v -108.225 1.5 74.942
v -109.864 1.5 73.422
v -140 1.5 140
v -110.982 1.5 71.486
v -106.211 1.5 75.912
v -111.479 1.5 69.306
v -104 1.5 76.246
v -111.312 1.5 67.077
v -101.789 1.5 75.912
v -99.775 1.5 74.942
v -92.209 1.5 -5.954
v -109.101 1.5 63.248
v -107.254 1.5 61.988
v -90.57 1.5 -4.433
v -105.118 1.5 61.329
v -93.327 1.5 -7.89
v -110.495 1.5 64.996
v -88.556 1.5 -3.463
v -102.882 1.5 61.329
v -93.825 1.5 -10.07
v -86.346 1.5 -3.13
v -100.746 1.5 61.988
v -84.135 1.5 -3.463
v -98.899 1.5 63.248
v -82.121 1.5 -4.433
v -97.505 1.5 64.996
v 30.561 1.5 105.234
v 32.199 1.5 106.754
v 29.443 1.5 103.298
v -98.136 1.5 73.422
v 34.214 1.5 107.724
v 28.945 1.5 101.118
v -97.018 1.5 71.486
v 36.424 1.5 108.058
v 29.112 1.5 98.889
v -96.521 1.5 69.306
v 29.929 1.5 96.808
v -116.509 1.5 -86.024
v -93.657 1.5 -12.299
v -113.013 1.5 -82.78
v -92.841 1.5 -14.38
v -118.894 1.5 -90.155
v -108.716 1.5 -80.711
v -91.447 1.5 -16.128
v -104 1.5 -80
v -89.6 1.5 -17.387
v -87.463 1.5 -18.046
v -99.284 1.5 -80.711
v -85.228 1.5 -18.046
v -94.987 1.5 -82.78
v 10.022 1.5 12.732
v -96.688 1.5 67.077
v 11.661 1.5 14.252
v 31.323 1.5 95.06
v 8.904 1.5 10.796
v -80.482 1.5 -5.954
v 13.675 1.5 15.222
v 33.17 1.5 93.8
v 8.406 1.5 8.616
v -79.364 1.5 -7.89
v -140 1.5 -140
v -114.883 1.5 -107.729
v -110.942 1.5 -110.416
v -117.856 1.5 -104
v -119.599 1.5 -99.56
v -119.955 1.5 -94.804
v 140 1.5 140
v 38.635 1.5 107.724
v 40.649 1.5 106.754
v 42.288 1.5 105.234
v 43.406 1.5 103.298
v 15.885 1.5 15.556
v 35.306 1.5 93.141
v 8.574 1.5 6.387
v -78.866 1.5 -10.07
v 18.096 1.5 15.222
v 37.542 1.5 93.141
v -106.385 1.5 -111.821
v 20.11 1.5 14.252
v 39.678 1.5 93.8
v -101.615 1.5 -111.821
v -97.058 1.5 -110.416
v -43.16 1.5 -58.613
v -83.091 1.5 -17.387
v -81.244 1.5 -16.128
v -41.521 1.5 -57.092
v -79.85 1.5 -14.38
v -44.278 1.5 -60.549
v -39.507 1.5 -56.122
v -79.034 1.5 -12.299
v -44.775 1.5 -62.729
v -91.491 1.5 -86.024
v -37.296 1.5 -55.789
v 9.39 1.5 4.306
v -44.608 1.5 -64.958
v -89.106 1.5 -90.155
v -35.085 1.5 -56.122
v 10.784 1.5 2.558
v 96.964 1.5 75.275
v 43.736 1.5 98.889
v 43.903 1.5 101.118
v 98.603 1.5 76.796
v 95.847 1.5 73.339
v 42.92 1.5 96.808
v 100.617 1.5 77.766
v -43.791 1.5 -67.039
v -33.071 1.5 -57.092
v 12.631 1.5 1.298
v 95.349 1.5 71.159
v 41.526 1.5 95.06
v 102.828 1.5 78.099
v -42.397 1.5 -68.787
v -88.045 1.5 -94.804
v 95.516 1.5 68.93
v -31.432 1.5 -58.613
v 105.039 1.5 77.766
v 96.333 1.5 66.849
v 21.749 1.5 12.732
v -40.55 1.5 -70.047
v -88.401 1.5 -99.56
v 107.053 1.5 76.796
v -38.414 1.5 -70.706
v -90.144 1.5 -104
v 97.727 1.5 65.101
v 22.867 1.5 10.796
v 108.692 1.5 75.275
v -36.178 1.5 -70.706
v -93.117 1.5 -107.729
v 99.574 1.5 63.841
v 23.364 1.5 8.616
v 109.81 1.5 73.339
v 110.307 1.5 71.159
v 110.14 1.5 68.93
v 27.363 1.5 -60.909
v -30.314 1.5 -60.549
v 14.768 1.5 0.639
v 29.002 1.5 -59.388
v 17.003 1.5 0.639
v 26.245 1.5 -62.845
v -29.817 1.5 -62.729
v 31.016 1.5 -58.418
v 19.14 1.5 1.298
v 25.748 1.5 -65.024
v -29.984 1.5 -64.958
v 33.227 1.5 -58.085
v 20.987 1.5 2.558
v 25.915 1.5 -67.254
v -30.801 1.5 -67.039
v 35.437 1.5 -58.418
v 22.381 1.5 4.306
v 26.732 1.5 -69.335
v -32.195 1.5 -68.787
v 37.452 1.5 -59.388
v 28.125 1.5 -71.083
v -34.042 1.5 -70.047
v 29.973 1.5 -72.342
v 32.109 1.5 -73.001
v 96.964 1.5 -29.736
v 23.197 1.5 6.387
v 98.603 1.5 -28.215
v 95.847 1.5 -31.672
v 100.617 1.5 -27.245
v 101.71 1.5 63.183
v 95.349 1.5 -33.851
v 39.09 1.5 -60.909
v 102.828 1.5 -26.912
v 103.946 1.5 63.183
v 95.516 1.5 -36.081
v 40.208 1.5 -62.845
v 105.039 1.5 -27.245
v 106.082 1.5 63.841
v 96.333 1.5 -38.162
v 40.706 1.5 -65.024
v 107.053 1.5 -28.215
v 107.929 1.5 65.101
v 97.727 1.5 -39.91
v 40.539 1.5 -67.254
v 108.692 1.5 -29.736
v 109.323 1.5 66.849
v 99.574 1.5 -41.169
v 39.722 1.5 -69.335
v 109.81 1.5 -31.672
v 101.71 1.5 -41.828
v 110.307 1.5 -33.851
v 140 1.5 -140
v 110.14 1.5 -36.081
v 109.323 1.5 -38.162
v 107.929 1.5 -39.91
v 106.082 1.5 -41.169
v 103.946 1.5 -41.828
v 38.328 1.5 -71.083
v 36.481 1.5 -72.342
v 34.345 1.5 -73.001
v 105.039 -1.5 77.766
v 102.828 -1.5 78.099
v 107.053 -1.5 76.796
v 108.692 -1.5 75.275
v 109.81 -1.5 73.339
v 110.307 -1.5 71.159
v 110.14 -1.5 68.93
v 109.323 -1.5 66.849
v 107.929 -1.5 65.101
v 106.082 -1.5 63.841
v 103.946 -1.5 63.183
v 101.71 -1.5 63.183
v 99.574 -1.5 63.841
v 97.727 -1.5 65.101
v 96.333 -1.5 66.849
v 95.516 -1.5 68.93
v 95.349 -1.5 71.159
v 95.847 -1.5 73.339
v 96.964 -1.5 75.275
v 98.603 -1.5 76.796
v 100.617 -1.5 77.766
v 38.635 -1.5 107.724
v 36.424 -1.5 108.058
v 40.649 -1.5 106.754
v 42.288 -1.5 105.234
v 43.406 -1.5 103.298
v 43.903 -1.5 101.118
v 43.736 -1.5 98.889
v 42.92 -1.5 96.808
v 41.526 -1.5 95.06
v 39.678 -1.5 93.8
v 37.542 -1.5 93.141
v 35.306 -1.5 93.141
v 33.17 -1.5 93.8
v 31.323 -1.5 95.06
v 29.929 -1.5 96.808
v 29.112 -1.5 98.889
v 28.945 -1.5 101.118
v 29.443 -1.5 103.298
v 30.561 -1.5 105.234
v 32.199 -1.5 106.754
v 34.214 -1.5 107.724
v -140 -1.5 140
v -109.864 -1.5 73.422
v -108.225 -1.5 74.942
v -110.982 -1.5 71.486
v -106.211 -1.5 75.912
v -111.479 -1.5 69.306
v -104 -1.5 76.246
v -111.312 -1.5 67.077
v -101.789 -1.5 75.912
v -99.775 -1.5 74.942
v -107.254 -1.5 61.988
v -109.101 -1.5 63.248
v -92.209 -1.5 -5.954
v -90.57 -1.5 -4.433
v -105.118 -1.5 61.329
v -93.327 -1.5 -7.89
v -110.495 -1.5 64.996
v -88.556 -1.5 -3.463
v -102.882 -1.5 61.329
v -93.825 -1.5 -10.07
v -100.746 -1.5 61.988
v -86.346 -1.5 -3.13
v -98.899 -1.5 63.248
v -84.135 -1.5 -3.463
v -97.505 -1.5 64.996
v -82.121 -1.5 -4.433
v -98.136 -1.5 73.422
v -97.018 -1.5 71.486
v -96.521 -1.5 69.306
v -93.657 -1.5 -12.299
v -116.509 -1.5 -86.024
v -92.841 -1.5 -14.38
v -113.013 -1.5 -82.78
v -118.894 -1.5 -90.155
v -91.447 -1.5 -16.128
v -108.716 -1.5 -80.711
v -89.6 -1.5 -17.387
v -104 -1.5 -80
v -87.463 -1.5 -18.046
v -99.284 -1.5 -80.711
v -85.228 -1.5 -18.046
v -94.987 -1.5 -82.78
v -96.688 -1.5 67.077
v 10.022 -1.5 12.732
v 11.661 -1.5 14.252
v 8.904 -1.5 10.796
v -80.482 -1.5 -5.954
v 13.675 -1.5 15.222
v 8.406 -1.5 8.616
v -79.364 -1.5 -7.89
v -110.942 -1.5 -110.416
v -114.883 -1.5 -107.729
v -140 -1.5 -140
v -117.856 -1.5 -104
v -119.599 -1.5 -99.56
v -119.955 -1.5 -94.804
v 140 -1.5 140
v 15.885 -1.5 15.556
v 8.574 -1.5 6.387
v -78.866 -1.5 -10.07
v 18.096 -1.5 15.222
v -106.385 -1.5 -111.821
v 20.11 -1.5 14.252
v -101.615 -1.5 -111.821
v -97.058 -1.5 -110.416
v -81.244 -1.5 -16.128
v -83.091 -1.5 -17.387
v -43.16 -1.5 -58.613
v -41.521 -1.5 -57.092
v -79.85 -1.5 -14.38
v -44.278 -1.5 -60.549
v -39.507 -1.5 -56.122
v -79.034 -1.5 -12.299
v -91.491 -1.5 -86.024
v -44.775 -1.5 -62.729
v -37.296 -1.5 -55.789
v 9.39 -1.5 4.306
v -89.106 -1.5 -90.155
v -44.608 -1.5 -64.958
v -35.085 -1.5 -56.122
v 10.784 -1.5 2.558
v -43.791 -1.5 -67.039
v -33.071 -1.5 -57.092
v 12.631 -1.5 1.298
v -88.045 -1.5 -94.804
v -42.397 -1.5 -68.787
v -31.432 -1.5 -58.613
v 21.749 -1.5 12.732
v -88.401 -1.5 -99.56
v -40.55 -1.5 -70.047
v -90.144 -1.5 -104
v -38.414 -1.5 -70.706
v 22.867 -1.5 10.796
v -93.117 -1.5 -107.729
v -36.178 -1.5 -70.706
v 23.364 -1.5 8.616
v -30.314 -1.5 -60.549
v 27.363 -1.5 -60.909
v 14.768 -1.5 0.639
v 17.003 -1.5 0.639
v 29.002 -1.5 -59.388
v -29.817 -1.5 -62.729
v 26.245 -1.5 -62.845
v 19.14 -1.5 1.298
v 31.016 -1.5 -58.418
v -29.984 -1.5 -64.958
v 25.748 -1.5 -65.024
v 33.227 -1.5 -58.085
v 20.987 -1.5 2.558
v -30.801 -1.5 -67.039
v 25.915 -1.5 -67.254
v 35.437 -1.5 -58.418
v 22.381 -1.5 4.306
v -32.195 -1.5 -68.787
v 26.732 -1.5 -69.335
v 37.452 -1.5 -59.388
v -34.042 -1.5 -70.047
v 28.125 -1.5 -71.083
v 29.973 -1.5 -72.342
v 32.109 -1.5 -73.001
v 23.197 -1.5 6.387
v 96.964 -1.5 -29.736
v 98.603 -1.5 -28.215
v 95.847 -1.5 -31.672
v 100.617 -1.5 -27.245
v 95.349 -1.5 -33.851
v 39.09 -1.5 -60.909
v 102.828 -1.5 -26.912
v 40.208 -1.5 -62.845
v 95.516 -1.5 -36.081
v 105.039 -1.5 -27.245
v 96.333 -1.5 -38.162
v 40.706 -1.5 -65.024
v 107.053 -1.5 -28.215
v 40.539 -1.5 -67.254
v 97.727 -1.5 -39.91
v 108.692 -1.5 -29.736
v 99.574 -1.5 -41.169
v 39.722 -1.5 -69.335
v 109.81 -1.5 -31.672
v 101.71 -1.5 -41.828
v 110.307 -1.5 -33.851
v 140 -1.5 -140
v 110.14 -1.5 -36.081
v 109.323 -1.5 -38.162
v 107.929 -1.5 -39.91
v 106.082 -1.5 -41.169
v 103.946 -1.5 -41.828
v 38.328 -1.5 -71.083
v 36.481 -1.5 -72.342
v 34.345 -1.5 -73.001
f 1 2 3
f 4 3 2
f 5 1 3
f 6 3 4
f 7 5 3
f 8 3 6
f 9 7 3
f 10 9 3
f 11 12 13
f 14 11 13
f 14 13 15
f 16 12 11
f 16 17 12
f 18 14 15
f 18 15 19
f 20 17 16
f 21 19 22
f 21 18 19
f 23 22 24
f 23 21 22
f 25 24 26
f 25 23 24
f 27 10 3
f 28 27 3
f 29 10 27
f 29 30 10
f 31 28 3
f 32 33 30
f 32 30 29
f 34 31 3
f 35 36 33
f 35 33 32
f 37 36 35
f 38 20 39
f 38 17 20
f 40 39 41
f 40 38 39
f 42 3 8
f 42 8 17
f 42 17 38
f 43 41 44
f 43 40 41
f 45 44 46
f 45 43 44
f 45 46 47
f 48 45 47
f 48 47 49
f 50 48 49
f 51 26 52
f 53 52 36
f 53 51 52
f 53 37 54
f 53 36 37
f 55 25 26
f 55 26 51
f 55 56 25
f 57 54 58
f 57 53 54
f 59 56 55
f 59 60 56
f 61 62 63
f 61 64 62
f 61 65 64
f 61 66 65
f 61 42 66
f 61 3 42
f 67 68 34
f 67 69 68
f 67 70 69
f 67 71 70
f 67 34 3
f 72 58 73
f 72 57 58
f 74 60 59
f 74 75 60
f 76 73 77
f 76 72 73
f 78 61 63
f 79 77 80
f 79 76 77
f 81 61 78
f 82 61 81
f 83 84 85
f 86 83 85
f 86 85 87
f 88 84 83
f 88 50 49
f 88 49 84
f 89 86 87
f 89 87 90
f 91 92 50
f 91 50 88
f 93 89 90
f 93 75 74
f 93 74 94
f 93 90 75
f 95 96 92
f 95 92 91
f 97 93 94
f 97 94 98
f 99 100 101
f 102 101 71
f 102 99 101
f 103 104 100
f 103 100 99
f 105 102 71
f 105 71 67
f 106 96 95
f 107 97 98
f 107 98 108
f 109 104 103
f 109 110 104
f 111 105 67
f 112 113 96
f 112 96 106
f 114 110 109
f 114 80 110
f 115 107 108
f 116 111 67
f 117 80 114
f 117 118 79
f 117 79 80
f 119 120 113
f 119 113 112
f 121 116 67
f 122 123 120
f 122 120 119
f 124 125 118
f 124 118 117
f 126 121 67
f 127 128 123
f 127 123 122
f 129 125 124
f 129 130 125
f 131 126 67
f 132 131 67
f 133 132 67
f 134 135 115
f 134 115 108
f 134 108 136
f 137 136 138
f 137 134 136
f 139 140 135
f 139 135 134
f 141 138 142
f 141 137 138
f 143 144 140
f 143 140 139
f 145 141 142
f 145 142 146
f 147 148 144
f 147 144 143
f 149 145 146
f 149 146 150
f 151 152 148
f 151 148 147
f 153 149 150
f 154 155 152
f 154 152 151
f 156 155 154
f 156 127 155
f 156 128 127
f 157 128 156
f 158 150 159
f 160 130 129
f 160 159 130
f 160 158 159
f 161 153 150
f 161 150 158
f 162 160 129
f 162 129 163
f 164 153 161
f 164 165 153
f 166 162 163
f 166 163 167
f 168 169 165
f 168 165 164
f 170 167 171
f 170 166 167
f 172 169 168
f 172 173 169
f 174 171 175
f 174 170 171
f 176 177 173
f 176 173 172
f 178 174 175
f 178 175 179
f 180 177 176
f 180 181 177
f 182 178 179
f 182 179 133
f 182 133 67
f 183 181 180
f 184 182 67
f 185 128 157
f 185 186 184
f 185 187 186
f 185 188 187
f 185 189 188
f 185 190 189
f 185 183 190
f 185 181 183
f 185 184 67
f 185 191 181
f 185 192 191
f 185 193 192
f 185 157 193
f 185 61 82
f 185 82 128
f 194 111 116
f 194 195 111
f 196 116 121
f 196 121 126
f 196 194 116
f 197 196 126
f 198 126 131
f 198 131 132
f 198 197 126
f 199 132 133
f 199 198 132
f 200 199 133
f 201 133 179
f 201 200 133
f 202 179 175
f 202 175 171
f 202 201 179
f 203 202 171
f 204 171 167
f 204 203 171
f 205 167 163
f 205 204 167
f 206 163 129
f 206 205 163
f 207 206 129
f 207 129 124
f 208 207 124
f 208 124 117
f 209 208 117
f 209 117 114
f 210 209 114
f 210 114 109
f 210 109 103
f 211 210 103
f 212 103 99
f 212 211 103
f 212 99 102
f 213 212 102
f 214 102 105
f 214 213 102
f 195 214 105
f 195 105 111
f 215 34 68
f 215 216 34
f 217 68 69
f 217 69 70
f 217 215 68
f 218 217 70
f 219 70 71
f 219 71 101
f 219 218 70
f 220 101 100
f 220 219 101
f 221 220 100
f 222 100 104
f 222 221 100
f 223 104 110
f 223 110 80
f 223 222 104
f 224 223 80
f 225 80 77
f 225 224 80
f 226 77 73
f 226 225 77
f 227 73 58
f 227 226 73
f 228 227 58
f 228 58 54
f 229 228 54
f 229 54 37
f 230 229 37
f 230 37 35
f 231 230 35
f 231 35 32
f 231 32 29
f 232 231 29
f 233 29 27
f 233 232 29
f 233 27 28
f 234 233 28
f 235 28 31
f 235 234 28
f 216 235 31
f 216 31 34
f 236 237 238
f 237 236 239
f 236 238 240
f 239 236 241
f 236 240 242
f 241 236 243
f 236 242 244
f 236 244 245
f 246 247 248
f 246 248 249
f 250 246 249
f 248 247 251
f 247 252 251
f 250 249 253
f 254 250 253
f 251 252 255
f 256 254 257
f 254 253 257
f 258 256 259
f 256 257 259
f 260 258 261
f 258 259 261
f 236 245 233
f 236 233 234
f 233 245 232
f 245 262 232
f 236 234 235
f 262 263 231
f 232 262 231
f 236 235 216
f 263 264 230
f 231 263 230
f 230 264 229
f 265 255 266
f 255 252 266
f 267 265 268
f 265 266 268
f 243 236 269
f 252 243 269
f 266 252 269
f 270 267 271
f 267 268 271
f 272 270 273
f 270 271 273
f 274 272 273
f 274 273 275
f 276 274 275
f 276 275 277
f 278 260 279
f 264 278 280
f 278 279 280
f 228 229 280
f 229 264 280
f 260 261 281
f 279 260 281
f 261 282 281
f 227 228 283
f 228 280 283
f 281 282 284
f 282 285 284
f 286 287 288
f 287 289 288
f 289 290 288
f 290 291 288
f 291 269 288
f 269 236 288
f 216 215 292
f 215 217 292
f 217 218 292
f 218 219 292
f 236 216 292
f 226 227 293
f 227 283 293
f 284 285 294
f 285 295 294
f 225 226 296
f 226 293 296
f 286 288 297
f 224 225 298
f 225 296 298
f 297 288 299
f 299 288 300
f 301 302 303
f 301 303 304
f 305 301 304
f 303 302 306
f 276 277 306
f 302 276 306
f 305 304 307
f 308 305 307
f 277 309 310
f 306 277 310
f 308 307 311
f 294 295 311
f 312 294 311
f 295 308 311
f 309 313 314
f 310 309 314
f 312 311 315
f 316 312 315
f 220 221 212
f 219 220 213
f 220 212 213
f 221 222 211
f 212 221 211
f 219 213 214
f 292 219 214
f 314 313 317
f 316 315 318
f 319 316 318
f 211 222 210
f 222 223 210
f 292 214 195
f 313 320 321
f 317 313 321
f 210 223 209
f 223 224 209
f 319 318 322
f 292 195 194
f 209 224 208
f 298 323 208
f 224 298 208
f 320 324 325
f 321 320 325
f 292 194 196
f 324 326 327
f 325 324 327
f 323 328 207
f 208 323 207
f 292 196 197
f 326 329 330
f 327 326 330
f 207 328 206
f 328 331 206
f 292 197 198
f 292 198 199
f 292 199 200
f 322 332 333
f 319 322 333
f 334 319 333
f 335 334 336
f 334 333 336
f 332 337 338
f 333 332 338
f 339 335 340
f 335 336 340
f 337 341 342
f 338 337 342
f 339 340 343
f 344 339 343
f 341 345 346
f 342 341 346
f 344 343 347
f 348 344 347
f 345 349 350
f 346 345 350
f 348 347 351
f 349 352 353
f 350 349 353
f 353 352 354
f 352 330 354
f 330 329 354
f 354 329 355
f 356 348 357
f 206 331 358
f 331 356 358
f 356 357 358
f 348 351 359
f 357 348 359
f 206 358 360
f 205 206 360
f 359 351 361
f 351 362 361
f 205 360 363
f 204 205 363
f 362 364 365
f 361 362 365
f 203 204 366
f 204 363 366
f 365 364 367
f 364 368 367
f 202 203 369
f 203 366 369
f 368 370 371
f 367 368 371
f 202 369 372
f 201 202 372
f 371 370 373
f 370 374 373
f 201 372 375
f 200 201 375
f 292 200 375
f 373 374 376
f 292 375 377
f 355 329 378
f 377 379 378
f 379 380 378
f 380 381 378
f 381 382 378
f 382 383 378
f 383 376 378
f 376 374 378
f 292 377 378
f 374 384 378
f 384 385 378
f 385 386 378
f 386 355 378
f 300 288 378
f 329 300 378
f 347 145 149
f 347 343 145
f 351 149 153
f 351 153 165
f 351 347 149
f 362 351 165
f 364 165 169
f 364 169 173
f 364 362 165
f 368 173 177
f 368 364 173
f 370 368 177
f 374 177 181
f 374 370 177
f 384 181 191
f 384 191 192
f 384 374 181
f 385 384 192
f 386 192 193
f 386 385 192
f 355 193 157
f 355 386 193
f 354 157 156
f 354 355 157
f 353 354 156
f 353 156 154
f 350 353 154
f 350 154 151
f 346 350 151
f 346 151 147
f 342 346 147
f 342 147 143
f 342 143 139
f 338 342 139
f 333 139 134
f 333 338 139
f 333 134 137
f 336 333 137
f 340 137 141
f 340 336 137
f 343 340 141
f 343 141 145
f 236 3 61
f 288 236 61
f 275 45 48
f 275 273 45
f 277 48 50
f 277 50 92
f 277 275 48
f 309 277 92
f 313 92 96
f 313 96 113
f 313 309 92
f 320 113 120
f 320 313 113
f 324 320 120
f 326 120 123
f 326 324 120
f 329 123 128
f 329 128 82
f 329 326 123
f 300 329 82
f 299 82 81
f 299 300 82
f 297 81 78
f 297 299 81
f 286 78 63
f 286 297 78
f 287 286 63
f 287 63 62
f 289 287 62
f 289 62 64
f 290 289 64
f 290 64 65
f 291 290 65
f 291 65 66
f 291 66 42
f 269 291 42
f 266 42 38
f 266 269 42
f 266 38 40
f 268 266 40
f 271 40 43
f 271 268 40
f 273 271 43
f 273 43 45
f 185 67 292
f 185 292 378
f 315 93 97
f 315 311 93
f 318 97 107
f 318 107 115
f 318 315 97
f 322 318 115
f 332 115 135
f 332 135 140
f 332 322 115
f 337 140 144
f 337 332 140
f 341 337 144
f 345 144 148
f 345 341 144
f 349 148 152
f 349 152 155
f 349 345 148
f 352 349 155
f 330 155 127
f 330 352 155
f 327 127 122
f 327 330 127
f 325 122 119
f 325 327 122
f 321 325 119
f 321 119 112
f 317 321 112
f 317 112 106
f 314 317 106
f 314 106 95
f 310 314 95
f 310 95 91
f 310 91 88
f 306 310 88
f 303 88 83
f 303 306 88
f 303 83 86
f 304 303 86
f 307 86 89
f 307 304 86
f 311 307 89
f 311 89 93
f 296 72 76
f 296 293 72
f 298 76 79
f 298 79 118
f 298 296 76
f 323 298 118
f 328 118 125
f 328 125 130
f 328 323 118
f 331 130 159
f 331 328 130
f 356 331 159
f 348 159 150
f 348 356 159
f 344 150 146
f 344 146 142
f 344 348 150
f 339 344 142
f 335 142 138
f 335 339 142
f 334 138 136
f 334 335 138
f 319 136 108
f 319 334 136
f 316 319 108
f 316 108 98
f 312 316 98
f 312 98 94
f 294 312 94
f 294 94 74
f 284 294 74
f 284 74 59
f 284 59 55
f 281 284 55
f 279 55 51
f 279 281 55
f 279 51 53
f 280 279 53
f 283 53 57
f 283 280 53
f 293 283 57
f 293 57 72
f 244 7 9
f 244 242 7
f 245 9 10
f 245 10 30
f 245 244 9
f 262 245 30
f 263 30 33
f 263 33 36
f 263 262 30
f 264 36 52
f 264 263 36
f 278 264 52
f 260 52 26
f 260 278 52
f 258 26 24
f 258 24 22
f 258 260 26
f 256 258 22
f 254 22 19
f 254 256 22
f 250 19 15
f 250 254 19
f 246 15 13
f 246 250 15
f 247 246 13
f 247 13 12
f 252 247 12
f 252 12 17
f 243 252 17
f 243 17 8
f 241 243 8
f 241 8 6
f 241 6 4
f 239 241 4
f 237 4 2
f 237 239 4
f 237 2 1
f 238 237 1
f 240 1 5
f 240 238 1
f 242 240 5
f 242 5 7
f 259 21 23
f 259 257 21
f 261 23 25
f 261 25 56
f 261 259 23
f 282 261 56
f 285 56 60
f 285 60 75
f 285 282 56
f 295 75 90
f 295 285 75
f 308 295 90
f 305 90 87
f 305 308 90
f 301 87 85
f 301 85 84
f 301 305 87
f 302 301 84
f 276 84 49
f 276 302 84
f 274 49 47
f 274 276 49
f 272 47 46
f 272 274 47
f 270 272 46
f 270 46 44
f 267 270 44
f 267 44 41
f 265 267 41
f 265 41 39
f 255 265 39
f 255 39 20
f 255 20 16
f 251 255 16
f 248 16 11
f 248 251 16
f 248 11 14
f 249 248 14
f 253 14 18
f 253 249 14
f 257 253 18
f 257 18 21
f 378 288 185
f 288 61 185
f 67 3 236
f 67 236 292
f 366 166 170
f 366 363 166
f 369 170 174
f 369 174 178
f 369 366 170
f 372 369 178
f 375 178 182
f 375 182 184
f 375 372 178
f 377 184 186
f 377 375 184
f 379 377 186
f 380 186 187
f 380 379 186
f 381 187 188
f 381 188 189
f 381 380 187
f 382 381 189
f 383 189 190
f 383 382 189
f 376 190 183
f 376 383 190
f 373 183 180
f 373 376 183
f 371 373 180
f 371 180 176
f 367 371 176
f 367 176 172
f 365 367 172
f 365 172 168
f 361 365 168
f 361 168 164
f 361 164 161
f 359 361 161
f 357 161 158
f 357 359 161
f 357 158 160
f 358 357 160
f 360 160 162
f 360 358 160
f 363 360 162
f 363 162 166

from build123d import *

# Parameters (mm, degrees)
SKETCH1_W           = 280
SKETCH1_H           = 280
SKETCH1_R           = 16
SKETCH1_R_2         = 7.5
BOSS_EXTRUDE1_DEPTH = 1.5


with BuildPart() as part:
    # Sketch1 → Boss-Extrude1 (new, symmetric)
    with BuildSketch(Plane(origin=(0, 0, 0), x_dir=(1, 0, 0), z_dir=(0, 1, 0))):
        Rectangle(SKETCH1_W, SKETCH1_H)
        with Locations(Location((-104, 96, 0), (0, 0, 270))):
            Circle(SKETCH1_R, mode=Mode.SUBTRACT)
        with Locations(Location((-86.345504448, 10.630092509, 0), (0, 0, 270))):
            Circle(SKETCH1_R_2, mode=Mode.SUBTRACT)
        with Locations(Location((-104, -68.745612269, 0), (0, 0, 270))):
            Circle(SKETCH1_R_2, mode=Mode.SUBTRACT)
        with Locations(Location((36.424311308, -100.557665157, 0), (0, 0, 270))):
            Circle(SKETCH1_R_2, mode=Mode.SUBTRACT)
        with Locations(Location((15.885461628, -8.055627876, 0), (0, 0, 270))):
            Circle(SKETCH1_R_2, mode=Mode.SUBTRACT)
        with Locations(Location((33.226728938, 65.584702367, 0), (0, 0, 270))):
            Circle(SKETCH1_R_2, mode=Mode.SUBTRACT)
        with Locations(Location((102.828111025, 34.411918454, 0), (0, 0, 270))):
            Circle(SKETCH1_R_2, mode=Mode.SUBTRACT)
        with Locations(Location((102.828111025, -70.598741563, 0), (0, 0, 270))):
            Circle(SKETCH1_R_2, mode=Mode.SUBTRACT)
        with Locations(Location((-37.296051937, 63.289287086, 0), (0, 0, 270))):
            Circle(SKETCH1_R_2, mode=Mode.SUBTRACT)
    extrude(amount=BOSS_EXTRUDE1_DEPTH, both=True)


solid = part.part
